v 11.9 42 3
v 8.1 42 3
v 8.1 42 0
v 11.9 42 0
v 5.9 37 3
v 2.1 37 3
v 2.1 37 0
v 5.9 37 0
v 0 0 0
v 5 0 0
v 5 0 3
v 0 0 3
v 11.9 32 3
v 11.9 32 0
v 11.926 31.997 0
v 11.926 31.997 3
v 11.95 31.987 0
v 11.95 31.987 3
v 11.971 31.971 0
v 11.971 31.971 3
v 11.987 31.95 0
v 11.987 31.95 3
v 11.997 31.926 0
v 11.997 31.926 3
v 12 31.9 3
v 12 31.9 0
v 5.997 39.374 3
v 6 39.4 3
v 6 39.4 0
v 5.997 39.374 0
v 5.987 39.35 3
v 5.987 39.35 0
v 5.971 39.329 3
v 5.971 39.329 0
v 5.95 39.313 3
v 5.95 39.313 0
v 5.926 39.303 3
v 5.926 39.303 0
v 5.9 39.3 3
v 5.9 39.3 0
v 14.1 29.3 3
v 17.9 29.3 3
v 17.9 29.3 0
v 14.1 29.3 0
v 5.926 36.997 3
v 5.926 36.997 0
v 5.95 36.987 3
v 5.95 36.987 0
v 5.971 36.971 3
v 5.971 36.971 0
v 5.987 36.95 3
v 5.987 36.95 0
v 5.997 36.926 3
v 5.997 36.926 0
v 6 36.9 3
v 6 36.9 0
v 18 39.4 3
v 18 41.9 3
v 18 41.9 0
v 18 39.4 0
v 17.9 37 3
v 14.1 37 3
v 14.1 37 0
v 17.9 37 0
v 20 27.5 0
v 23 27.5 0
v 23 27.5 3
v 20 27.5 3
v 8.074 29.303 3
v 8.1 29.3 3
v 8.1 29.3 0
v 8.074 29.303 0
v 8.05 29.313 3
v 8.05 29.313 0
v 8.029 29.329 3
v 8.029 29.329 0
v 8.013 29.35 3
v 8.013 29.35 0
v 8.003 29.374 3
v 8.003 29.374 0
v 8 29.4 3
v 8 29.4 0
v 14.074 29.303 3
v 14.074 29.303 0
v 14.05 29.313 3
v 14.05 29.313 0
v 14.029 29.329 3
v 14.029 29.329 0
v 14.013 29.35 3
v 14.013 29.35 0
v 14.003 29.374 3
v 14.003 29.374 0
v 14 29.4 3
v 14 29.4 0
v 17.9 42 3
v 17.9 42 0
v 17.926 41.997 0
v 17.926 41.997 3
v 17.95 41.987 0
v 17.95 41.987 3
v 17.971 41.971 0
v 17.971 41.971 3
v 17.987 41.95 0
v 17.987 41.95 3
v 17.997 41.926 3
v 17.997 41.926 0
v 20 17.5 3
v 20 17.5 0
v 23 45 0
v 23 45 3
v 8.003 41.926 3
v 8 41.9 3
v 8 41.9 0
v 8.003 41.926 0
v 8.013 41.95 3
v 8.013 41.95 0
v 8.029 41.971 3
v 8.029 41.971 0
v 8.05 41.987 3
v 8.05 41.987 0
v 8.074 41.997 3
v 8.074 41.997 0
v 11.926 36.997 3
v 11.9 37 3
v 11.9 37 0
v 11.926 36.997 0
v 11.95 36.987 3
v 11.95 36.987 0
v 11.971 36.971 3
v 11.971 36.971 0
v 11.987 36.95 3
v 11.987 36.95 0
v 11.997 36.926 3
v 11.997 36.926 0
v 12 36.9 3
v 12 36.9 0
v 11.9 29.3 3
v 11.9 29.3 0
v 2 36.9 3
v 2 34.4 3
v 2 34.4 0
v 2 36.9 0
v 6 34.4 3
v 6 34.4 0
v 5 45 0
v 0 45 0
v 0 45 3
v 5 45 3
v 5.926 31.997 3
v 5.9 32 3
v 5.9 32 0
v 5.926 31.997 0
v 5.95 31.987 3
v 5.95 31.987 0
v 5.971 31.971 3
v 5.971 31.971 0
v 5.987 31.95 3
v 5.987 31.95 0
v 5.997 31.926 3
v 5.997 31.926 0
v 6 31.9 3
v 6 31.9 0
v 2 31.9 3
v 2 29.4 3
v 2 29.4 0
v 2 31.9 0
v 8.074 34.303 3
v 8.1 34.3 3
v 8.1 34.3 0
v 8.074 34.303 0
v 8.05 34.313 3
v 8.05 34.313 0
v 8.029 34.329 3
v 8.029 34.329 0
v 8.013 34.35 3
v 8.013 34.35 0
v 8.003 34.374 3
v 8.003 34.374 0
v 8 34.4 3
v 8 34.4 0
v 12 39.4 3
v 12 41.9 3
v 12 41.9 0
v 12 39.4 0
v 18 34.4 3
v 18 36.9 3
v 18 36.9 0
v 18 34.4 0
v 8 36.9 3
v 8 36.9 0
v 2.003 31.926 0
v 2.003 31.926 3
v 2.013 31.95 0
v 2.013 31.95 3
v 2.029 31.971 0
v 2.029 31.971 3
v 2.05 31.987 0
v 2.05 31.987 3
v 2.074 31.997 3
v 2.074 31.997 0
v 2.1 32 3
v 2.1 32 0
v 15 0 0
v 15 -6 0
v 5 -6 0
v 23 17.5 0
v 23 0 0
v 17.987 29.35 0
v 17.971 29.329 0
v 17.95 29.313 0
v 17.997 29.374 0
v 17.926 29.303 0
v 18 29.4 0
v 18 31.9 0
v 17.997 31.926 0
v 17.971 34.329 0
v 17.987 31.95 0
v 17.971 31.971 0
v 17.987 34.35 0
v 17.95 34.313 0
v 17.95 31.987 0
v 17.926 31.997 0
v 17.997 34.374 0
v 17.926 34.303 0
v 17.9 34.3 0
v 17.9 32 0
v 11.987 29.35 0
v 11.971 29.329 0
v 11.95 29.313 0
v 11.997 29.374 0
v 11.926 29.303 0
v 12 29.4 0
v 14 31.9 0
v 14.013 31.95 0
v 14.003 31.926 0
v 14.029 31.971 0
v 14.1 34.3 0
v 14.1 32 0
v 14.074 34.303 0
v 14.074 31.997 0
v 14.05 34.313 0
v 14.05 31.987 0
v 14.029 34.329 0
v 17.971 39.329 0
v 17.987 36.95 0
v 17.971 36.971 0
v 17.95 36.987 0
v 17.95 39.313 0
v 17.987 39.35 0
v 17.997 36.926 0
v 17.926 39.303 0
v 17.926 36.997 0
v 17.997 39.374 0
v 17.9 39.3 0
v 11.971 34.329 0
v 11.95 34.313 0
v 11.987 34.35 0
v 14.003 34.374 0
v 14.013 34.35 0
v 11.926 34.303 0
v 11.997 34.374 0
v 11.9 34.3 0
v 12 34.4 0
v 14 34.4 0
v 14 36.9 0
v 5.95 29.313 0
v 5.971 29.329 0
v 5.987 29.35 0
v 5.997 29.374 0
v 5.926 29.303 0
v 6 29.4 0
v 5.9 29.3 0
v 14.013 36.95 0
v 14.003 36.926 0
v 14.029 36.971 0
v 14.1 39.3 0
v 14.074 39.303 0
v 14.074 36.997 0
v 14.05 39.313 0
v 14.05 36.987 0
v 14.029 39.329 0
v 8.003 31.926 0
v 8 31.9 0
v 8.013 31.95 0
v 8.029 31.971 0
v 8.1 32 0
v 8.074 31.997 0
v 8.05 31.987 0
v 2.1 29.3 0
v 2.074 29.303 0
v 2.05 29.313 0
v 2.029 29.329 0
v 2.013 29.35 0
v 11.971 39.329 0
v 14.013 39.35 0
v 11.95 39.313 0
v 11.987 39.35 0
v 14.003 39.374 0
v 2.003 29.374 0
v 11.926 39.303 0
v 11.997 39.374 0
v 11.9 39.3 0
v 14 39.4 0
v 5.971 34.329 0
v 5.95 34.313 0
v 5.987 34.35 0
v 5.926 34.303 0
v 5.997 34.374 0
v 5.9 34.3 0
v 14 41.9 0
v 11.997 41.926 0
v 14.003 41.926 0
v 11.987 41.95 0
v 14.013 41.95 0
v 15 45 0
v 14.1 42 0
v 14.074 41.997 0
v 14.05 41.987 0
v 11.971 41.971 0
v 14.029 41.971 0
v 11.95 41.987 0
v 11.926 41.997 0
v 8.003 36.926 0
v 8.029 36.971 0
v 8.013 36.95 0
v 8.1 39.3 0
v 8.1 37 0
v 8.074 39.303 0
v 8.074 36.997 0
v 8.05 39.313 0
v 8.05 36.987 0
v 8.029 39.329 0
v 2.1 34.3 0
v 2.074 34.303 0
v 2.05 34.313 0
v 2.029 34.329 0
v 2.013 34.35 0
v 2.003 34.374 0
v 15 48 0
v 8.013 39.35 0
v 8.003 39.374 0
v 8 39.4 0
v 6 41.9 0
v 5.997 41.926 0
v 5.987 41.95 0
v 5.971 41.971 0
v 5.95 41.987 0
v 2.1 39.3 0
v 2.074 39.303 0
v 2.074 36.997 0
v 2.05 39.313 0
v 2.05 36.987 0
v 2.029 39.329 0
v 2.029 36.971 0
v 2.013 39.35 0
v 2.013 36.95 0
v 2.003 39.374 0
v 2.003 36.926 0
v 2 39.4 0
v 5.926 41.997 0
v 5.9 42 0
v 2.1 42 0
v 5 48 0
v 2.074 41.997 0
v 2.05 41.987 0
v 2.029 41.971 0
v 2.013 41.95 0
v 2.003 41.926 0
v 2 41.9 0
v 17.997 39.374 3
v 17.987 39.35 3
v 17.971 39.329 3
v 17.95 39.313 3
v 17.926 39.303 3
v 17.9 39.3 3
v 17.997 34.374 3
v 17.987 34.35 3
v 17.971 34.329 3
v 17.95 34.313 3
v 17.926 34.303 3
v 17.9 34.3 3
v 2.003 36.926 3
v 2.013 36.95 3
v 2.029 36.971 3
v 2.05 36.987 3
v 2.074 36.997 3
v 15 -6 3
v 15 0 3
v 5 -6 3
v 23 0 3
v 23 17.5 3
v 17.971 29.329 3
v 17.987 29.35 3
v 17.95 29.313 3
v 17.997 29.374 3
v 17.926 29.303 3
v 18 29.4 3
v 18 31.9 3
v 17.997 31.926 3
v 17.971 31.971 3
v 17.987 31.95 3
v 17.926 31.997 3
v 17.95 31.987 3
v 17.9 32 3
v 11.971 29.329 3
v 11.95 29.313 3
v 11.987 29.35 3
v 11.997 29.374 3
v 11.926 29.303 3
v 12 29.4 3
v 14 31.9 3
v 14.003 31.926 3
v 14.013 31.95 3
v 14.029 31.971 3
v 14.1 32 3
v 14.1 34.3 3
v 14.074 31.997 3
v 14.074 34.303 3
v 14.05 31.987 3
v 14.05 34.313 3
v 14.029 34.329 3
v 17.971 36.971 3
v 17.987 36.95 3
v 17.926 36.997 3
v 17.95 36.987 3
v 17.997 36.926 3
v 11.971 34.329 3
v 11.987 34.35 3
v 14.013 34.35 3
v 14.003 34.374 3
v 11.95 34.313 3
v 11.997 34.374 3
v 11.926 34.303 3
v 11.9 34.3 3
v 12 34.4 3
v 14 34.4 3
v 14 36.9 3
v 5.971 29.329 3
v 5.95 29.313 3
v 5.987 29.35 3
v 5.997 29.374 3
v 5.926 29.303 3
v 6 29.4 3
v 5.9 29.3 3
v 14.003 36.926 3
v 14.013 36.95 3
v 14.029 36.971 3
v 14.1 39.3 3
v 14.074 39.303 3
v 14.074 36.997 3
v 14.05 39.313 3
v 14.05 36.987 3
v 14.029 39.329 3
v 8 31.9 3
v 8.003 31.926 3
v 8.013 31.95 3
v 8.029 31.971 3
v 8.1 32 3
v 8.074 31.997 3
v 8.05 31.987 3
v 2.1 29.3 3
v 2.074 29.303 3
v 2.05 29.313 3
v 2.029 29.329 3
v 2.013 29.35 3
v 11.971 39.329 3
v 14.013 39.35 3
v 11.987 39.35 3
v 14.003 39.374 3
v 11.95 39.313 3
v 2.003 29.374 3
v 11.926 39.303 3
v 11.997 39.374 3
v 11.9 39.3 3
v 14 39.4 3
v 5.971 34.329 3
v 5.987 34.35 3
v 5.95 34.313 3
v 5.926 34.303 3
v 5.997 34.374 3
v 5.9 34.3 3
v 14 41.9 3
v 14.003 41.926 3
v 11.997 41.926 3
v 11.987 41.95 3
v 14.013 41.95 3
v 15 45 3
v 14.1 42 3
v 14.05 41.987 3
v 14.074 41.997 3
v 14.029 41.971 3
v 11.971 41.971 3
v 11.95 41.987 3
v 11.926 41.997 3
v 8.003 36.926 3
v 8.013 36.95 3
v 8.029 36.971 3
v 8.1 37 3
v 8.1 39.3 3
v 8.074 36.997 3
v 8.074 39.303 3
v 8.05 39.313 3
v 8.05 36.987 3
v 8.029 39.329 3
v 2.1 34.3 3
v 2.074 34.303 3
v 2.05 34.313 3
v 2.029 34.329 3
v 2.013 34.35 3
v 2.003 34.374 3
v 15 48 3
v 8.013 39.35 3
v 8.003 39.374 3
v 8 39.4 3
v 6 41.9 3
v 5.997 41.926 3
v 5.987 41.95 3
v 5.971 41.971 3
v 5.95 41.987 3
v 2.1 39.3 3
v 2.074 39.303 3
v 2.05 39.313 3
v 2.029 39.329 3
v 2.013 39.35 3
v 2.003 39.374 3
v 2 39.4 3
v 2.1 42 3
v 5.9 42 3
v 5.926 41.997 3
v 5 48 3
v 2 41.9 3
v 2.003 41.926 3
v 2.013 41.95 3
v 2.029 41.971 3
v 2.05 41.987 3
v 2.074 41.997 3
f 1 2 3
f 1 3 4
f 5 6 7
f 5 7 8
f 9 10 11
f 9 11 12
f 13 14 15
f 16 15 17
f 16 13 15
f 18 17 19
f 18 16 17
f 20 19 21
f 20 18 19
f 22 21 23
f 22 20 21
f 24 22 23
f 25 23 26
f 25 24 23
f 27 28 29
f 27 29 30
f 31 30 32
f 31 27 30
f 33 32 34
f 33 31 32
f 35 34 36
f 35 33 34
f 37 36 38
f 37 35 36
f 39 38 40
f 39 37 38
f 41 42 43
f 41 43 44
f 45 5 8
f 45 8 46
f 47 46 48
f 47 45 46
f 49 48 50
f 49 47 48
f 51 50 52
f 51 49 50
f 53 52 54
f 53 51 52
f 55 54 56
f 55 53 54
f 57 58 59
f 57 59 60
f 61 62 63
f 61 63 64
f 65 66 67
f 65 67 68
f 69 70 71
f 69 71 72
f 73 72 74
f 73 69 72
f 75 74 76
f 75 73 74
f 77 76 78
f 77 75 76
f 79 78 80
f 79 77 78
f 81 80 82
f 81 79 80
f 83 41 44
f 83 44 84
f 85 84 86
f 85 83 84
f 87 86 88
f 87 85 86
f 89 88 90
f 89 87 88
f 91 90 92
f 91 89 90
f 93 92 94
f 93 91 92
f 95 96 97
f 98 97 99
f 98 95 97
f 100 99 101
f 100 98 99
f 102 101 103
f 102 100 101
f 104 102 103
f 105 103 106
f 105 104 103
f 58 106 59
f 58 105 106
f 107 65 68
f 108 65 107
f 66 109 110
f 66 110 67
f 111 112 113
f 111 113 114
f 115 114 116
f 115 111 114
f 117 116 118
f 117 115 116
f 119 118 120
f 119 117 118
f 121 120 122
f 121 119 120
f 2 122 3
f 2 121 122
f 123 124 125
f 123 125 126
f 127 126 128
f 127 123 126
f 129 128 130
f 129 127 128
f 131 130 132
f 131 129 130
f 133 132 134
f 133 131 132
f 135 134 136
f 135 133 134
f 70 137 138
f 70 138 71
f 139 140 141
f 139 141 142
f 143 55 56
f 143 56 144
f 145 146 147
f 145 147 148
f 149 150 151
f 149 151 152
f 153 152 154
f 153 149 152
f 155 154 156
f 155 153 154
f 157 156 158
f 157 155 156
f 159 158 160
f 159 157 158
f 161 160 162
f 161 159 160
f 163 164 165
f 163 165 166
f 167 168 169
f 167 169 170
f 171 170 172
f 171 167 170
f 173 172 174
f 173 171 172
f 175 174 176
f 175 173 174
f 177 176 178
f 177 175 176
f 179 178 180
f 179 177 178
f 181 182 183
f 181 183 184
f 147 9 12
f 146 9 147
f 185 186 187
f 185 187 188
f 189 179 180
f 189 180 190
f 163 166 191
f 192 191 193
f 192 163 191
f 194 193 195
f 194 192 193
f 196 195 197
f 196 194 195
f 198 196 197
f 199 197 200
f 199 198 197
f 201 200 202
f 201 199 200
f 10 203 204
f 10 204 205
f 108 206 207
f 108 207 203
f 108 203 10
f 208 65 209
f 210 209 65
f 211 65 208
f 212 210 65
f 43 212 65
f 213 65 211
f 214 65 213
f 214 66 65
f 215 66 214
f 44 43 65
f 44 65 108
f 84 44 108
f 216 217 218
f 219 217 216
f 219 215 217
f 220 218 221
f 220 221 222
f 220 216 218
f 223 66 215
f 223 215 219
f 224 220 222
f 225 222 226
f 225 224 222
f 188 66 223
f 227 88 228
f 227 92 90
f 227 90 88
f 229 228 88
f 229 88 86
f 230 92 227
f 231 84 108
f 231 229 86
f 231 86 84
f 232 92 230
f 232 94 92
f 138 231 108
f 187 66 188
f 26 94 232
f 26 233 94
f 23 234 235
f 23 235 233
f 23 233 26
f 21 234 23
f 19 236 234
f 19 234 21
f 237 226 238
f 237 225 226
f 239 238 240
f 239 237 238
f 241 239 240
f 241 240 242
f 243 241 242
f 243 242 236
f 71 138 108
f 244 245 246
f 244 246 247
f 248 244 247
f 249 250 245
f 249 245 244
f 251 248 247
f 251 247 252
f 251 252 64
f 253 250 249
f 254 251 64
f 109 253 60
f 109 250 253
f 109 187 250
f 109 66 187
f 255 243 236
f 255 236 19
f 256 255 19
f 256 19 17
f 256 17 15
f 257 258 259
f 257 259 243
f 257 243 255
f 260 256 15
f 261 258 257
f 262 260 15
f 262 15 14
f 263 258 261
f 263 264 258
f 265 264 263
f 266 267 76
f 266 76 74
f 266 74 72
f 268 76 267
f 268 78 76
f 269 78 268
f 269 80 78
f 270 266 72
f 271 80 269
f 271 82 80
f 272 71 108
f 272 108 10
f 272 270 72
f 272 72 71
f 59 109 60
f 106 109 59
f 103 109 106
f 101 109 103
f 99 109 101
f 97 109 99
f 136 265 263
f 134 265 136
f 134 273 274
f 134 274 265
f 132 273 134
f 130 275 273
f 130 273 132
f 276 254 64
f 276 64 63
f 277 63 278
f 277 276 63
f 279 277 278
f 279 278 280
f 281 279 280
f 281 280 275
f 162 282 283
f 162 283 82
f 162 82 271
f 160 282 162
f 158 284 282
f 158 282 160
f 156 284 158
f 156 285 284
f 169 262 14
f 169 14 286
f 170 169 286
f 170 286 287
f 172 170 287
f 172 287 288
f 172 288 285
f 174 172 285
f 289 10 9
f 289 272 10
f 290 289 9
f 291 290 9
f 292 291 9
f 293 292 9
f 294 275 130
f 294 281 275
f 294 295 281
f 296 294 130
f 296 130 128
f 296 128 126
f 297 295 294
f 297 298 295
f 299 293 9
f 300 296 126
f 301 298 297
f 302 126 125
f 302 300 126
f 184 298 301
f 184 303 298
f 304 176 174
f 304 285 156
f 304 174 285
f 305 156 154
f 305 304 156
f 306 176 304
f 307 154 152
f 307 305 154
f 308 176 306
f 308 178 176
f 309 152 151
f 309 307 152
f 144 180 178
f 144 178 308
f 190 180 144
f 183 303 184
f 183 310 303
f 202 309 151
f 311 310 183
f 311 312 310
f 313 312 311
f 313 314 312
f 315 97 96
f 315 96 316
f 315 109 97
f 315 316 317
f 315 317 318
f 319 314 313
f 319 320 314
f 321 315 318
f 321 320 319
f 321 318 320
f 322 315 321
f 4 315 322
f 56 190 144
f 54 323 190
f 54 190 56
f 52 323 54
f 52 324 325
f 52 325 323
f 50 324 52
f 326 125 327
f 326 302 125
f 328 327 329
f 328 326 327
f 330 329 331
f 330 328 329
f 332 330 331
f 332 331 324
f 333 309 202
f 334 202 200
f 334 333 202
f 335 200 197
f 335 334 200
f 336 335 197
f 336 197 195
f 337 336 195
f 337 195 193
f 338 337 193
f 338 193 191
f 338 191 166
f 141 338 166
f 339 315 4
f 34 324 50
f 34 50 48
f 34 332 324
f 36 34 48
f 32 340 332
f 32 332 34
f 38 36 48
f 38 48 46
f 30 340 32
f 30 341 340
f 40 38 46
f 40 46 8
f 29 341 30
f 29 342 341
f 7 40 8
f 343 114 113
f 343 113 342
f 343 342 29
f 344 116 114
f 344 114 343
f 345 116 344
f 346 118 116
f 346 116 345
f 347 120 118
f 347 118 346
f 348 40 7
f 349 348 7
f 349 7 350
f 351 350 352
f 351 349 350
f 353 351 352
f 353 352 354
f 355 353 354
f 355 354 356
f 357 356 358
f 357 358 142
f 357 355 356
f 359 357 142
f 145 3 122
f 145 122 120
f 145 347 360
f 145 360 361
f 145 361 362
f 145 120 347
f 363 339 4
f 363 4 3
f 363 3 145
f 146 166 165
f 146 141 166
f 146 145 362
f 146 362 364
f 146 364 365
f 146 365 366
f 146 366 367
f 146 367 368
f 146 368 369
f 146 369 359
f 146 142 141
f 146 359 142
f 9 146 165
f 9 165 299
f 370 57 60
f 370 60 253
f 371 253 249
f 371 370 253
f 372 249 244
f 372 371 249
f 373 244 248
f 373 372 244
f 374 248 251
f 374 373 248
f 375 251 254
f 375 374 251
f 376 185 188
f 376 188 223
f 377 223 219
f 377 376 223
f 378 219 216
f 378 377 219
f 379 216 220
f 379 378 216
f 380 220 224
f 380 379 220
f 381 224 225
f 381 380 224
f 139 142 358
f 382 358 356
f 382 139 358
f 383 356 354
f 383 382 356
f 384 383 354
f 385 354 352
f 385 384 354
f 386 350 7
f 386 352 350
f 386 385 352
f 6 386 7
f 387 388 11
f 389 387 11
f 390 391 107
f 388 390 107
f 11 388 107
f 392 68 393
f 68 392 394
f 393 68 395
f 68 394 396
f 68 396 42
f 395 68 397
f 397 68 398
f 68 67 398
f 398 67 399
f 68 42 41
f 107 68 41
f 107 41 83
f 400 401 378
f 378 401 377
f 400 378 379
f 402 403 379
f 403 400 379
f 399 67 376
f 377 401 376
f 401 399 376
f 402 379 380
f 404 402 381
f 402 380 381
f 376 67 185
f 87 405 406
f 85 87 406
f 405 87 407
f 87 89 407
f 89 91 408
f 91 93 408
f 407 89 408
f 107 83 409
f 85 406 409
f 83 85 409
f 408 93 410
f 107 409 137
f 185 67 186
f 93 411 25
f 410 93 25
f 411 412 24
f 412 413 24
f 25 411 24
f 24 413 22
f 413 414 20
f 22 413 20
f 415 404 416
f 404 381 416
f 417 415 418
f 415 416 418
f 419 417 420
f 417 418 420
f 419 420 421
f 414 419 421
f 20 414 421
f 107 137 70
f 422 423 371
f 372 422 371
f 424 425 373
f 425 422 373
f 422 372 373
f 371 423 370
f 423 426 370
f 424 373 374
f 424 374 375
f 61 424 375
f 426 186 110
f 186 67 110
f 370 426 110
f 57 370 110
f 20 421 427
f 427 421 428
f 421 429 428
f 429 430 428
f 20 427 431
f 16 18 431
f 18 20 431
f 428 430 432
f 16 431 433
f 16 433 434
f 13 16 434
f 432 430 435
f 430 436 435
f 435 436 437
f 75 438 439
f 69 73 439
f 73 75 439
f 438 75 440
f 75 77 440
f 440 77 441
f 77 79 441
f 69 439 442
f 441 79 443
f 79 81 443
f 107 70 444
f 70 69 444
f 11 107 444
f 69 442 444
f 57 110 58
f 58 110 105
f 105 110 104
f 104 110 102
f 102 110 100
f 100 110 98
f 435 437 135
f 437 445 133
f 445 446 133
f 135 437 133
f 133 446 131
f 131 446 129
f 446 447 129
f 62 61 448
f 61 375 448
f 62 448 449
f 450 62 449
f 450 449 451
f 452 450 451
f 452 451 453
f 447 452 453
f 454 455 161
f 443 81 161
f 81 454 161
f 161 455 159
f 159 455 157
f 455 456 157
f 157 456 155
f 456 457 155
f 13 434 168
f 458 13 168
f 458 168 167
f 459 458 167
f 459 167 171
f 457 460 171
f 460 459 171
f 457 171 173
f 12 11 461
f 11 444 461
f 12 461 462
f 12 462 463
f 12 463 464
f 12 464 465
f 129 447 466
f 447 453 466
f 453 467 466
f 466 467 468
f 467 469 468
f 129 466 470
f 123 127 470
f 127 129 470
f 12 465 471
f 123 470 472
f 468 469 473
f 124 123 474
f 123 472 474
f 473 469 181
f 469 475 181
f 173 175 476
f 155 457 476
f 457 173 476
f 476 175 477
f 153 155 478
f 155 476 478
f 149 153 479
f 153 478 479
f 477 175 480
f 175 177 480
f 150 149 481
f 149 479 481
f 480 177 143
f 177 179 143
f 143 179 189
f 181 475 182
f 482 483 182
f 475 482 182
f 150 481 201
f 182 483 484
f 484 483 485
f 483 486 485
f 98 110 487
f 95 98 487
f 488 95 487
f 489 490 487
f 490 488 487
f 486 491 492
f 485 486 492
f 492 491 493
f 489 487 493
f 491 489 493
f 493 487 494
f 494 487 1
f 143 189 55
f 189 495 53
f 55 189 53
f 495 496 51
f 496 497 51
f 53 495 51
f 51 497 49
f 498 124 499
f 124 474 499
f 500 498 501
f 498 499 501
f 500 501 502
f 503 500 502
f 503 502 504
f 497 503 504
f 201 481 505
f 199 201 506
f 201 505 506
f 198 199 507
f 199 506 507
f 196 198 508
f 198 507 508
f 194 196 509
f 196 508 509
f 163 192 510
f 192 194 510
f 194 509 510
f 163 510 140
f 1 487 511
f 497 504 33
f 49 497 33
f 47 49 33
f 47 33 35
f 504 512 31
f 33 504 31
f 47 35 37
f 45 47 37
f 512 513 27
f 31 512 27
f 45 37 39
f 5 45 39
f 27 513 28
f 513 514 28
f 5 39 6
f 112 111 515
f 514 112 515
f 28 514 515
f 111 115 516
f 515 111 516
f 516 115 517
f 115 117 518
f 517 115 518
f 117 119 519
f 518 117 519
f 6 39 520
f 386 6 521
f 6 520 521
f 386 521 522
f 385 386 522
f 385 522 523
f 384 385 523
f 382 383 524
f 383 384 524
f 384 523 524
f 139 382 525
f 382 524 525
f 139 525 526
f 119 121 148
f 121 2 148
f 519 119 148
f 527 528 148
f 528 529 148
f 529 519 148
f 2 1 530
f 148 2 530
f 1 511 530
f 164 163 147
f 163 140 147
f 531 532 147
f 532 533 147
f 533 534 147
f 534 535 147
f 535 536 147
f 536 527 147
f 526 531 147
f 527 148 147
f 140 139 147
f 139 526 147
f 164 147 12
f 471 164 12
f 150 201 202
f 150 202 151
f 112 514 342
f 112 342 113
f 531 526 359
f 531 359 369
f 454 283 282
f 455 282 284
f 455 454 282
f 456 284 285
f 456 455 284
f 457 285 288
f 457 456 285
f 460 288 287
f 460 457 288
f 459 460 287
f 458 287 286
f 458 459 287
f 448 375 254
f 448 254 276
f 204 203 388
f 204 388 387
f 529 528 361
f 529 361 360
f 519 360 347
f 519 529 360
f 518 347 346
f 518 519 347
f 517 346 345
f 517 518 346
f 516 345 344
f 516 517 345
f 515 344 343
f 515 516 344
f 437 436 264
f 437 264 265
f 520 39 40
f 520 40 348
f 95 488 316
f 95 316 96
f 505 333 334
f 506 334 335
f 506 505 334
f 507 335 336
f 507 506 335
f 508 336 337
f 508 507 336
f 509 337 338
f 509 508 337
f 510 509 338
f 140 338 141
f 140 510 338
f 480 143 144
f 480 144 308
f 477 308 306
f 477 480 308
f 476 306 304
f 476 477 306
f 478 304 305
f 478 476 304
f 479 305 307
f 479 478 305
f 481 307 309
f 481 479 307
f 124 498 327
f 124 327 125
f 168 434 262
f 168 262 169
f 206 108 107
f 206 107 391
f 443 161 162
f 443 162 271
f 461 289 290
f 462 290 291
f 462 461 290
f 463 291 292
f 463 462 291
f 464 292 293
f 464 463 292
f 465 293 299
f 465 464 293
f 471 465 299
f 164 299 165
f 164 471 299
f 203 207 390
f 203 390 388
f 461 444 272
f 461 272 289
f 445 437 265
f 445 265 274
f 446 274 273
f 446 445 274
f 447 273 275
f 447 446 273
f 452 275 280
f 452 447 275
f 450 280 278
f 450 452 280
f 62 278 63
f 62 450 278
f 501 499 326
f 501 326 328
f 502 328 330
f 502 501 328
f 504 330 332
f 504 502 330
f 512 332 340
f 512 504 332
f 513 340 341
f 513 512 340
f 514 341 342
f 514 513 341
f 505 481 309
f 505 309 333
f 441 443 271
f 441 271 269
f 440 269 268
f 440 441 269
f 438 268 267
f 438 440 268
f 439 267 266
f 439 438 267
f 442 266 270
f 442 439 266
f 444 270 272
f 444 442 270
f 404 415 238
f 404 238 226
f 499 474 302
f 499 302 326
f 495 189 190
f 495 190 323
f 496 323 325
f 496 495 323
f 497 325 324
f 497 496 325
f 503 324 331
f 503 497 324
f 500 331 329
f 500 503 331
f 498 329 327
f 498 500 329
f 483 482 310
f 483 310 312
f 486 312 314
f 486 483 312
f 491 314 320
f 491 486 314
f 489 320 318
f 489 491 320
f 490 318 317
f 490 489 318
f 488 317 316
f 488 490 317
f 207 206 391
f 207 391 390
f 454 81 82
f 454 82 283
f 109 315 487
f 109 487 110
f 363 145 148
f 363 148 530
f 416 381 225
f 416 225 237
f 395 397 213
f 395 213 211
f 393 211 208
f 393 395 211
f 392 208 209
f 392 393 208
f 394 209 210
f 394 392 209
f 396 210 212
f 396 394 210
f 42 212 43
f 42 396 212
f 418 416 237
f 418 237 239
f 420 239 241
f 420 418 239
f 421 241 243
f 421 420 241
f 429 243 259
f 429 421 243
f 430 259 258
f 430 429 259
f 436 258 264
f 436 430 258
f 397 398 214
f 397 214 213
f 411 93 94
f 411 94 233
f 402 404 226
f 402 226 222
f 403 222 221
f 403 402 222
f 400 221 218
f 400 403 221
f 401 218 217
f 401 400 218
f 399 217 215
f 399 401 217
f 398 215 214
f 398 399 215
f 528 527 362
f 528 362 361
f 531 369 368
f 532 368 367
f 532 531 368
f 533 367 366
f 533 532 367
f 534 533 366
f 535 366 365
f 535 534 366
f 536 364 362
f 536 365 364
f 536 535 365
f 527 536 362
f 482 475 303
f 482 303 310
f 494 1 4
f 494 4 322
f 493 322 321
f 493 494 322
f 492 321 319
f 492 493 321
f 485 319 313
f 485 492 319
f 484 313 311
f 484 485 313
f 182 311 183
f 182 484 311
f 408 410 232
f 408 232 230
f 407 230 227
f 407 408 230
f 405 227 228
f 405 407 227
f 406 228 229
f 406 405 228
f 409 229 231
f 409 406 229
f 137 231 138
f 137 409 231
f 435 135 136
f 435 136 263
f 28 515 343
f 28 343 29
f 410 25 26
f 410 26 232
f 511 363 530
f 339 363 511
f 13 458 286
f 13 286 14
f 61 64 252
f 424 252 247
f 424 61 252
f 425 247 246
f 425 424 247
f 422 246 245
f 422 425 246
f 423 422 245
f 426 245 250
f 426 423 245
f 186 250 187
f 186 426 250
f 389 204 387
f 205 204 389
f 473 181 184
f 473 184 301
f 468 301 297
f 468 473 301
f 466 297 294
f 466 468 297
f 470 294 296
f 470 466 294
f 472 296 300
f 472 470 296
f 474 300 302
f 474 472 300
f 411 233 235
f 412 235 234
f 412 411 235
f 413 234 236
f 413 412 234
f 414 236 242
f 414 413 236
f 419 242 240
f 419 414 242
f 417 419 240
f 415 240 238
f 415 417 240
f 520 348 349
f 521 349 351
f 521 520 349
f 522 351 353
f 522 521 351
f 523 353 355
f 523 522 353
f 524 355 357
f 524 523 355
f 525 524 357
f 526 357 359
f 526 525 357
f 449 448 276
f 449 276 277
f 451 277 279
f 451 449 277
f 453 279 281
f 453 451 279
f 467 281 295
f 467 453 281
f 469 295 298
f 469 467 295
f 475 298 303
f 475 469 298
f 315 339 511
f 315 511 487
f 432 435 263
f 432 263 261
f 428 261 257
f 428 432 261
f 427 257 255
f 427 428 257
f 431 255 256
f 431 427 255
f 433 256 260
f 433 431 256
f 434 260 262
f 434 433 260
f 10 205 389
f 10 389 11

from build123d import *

# Parameters (mm, degrees)
BOSS_EXTRUDE1_DEPTH = 3
CUT_EXTRUDE1_DEPTH  = 54.310411741


with BuildPart() as part:
    # Sketch1 → Boss-Extrude1 (new body)
    with BuildSketch(Plane.XY):
        Polygon((0, 0), (0, 45), (5, 45), (5, 48), (15, 48), (15, 45), (23, 45), (23, 27.5), (20, 27.5), (20, 17.5), (23, 17.5), (23, 0), (15, 0), (15, -6), (5, -6), (5, 0), align=None)
    extrude(amount=BOSS_EXTRUDE1_DEPTH)

    # Sketch2 → Cut-Extrude1 (cut, through all)
    with BuildSketch(Plane.XY.offset(3)):
        with BuildLine():
            Line((2.1, 42), (5.9, 42))
            ThreePointArc((5.9, 42), (5.970710678, 41.970710678), (6, 41.9))
            Line((6, 41.9), (6, 39.4))
            ThreePointArc((6, 39.4), (5.970710678, 39.329289322), (5.9, 39.3))
            Line((5.9, 39.3), (2.1, 39.3))
            ThreePointArc((2.1, 39.3), (2.029289322, 39.329289322), (2, 39.4))
            Line((2, 39.4), (2, 41.9))
            ThreePointArc((2, 41.9), (2.029289322, 41.970710678), (2.1, 42))
        make_face()
        with BuildLine():
            Line((8.1, 42), (11.9, 42))
            ThreePointArc((11.9, 42), (11.970710678, 41.970710678), (12, 41.9))
            Line((12, 41.9), (12, 39.4))
            ThreePointArc((12, 39.4), (11.970710678, 39.329289322), (11.9, 39.3))
            Line((11.9, 39.3), (8.1, 39.3))
            ThreePointArc((8.1, 39.3), (8.029289322, 39.329289322), (8, 39.4))
            Line((8, 39.4), (8, 41.9))
            ThreePointArc((8, 41.9), (8.029289322, 41.970710678), (8.1, 42))
        make_face()
        with BuildLine():
            Line((14.1, 42), (17.9, 42))
            ThreePointArc((17.9, 42), (17.970710678, 41.970710678), (18, 41.9))
            Line((18, 41.9), (18, 39.4))
            ThreePointArc((18, 39.4), (17.970710678, 39.329289322), (17.9, 39.3))
            Line((17.9, 39.3), (14.1, 39.3))
            ThreePointArc((14.1, 39.3), (14.029289322, 39.329289322), (14, 39.4))
            Line((14, 39.4), (14, 41.9))
            ThreePointArc((14, 41.9), (14.029289322, 41.970710678), (14.1, 42))
        make_face()
        with BuildLine():
            Line((8.1, 37), (11.9, 37))
            ThreePointArc((11.9, 37), (11.970710678, 36.970710678), (12, 36.9))
            Line((12, 36.9), (12, 34.4))
            ThreePointArc((12, 34.4), (11.970710678, 34.329289322), (11.9, 34.3))
            Line((11.9, 34.3), (8.1, 34.3))
            ThreePointArc((8.1, 34.3), (8.029289322, 34.329289322), (8, 34.4))
            Line((8, 34.4), (8, 36.9))
            ThreePointArc((8, 36.9), (8.029289322, 36.970710678), (8.1, 37))
        make_face()
        with BuildLine():
            Line((14.1, 37), (17.9, 37))
            ThreePointArc((17.9, 37), (17.970710678, 36.970710678), (18, 36.9))
            Line((18, 36.9), (18, 34.4))
            ThreePointArc((18, 34.4), (17.970710678, 34.329289322), (17.9, 34.3))
            Line((17.9, 34.3), (14.1, 34.3))
            ThreePointArc((14.1, 34.3), (14.029289322, 34.329289322), (14, 34.4))
            Line((14, 34.4), (14, 36.9))
            ThreePointArc((14, 36.9), (14.029289322, 36.970710678), (14.1, 37))
        make_face()
        with BuildLine():
            Line((8.1, 32), (11.9, 32))
            ThreePointArc((11.9, 32), (11.970710678, 31.970710678), (12, 31.9))
            Line((12, 31.9), (12, 29.4))
            ThreePointArc((12, 29.4), (11.970710678, 29.329289322), (11.9, 29.3))
            Line((11.9, 29.3), (8.1, 29.3))
            ThreePointArc((8.1, 29.3), (8.029289322, 29.329289322), (8, 29.4))
            Line((8, 29.4), (8, 31.9))
            ThreePointArc((8, 31.9), (8.029289322, 31.970710678), (8.1, 32))
        make_face()
        with BuildLine():
            Line((14.1, 32), (17.9, 32))
            ThreePointArc((17.9, 32), (17.970710678, 31.970710678), (18, 31.9))
            Line((18, 31.9), (18, 29.4))
            ThreePointArc((18, 29.4), (17.970710678, 29.329289322), (17.9, 29.3))
            Line((17.9, 29.3), (14.1, 29.3))
            ThreePointArc((14.1, 29.3), (14.029289322, 29.329289322), (14, 29.4))
            Line((14, 29.4), (14, 31.9))
            ThreePointArc((14, 31.9), (14.029289322, 31.970710678), (14.1, 32))
        make_face()
        with BuildLine():
            Line((2.1, 37), (5.9, 37))
            ThreePointArc((5.9, 37), (5.970710678, 36.970710678), (6, 36.9))
            Line((6, 36.9), (6, 34.4))
            ThreePointArc((6, 34.4), (5.970710678, 34.329289322), (5.9, 34.3))
            Line((5.9, 34.3), (2.1, 34.3))
            ThreePointArc((2.1, 34.3), (2.029289322, 34.329289322), (2, 34.4))
            Line((2, 34.4), (2, 36.9))
            ThreePointArc((2, 36.9), (2.029289322, 36.970710678), (2.1, 37))
        make_face()
        with BuildLine():
            Line((2.1, 32), (5.9, 32))
            ThreePointArc((5.9, 32), (5.970710678, 31.970710678), (6, 31.9))
            Line((6, 31.9), (6, 29.4))
            ThreePointArc((6, 29.4), (5.970710678, 29.329289322), (5.9, 29.3))
            Line((5.9, 29.3), (2.1, 29.3))
            ThreePointArc((2.1, 29.3), (2.029289322, 29.329289322), (2, 29.4))
            Line((2, 29.4), (2, 31.9))
            ThreePointArc((2, 31.9), (2.029289322, 31.970710678), (2.1, 32))
        make_face()
    extrude(amount=-CUT_EXTRUDE1_DEPTH, mode=Mode.SUBTRACT)


solid = part.part
